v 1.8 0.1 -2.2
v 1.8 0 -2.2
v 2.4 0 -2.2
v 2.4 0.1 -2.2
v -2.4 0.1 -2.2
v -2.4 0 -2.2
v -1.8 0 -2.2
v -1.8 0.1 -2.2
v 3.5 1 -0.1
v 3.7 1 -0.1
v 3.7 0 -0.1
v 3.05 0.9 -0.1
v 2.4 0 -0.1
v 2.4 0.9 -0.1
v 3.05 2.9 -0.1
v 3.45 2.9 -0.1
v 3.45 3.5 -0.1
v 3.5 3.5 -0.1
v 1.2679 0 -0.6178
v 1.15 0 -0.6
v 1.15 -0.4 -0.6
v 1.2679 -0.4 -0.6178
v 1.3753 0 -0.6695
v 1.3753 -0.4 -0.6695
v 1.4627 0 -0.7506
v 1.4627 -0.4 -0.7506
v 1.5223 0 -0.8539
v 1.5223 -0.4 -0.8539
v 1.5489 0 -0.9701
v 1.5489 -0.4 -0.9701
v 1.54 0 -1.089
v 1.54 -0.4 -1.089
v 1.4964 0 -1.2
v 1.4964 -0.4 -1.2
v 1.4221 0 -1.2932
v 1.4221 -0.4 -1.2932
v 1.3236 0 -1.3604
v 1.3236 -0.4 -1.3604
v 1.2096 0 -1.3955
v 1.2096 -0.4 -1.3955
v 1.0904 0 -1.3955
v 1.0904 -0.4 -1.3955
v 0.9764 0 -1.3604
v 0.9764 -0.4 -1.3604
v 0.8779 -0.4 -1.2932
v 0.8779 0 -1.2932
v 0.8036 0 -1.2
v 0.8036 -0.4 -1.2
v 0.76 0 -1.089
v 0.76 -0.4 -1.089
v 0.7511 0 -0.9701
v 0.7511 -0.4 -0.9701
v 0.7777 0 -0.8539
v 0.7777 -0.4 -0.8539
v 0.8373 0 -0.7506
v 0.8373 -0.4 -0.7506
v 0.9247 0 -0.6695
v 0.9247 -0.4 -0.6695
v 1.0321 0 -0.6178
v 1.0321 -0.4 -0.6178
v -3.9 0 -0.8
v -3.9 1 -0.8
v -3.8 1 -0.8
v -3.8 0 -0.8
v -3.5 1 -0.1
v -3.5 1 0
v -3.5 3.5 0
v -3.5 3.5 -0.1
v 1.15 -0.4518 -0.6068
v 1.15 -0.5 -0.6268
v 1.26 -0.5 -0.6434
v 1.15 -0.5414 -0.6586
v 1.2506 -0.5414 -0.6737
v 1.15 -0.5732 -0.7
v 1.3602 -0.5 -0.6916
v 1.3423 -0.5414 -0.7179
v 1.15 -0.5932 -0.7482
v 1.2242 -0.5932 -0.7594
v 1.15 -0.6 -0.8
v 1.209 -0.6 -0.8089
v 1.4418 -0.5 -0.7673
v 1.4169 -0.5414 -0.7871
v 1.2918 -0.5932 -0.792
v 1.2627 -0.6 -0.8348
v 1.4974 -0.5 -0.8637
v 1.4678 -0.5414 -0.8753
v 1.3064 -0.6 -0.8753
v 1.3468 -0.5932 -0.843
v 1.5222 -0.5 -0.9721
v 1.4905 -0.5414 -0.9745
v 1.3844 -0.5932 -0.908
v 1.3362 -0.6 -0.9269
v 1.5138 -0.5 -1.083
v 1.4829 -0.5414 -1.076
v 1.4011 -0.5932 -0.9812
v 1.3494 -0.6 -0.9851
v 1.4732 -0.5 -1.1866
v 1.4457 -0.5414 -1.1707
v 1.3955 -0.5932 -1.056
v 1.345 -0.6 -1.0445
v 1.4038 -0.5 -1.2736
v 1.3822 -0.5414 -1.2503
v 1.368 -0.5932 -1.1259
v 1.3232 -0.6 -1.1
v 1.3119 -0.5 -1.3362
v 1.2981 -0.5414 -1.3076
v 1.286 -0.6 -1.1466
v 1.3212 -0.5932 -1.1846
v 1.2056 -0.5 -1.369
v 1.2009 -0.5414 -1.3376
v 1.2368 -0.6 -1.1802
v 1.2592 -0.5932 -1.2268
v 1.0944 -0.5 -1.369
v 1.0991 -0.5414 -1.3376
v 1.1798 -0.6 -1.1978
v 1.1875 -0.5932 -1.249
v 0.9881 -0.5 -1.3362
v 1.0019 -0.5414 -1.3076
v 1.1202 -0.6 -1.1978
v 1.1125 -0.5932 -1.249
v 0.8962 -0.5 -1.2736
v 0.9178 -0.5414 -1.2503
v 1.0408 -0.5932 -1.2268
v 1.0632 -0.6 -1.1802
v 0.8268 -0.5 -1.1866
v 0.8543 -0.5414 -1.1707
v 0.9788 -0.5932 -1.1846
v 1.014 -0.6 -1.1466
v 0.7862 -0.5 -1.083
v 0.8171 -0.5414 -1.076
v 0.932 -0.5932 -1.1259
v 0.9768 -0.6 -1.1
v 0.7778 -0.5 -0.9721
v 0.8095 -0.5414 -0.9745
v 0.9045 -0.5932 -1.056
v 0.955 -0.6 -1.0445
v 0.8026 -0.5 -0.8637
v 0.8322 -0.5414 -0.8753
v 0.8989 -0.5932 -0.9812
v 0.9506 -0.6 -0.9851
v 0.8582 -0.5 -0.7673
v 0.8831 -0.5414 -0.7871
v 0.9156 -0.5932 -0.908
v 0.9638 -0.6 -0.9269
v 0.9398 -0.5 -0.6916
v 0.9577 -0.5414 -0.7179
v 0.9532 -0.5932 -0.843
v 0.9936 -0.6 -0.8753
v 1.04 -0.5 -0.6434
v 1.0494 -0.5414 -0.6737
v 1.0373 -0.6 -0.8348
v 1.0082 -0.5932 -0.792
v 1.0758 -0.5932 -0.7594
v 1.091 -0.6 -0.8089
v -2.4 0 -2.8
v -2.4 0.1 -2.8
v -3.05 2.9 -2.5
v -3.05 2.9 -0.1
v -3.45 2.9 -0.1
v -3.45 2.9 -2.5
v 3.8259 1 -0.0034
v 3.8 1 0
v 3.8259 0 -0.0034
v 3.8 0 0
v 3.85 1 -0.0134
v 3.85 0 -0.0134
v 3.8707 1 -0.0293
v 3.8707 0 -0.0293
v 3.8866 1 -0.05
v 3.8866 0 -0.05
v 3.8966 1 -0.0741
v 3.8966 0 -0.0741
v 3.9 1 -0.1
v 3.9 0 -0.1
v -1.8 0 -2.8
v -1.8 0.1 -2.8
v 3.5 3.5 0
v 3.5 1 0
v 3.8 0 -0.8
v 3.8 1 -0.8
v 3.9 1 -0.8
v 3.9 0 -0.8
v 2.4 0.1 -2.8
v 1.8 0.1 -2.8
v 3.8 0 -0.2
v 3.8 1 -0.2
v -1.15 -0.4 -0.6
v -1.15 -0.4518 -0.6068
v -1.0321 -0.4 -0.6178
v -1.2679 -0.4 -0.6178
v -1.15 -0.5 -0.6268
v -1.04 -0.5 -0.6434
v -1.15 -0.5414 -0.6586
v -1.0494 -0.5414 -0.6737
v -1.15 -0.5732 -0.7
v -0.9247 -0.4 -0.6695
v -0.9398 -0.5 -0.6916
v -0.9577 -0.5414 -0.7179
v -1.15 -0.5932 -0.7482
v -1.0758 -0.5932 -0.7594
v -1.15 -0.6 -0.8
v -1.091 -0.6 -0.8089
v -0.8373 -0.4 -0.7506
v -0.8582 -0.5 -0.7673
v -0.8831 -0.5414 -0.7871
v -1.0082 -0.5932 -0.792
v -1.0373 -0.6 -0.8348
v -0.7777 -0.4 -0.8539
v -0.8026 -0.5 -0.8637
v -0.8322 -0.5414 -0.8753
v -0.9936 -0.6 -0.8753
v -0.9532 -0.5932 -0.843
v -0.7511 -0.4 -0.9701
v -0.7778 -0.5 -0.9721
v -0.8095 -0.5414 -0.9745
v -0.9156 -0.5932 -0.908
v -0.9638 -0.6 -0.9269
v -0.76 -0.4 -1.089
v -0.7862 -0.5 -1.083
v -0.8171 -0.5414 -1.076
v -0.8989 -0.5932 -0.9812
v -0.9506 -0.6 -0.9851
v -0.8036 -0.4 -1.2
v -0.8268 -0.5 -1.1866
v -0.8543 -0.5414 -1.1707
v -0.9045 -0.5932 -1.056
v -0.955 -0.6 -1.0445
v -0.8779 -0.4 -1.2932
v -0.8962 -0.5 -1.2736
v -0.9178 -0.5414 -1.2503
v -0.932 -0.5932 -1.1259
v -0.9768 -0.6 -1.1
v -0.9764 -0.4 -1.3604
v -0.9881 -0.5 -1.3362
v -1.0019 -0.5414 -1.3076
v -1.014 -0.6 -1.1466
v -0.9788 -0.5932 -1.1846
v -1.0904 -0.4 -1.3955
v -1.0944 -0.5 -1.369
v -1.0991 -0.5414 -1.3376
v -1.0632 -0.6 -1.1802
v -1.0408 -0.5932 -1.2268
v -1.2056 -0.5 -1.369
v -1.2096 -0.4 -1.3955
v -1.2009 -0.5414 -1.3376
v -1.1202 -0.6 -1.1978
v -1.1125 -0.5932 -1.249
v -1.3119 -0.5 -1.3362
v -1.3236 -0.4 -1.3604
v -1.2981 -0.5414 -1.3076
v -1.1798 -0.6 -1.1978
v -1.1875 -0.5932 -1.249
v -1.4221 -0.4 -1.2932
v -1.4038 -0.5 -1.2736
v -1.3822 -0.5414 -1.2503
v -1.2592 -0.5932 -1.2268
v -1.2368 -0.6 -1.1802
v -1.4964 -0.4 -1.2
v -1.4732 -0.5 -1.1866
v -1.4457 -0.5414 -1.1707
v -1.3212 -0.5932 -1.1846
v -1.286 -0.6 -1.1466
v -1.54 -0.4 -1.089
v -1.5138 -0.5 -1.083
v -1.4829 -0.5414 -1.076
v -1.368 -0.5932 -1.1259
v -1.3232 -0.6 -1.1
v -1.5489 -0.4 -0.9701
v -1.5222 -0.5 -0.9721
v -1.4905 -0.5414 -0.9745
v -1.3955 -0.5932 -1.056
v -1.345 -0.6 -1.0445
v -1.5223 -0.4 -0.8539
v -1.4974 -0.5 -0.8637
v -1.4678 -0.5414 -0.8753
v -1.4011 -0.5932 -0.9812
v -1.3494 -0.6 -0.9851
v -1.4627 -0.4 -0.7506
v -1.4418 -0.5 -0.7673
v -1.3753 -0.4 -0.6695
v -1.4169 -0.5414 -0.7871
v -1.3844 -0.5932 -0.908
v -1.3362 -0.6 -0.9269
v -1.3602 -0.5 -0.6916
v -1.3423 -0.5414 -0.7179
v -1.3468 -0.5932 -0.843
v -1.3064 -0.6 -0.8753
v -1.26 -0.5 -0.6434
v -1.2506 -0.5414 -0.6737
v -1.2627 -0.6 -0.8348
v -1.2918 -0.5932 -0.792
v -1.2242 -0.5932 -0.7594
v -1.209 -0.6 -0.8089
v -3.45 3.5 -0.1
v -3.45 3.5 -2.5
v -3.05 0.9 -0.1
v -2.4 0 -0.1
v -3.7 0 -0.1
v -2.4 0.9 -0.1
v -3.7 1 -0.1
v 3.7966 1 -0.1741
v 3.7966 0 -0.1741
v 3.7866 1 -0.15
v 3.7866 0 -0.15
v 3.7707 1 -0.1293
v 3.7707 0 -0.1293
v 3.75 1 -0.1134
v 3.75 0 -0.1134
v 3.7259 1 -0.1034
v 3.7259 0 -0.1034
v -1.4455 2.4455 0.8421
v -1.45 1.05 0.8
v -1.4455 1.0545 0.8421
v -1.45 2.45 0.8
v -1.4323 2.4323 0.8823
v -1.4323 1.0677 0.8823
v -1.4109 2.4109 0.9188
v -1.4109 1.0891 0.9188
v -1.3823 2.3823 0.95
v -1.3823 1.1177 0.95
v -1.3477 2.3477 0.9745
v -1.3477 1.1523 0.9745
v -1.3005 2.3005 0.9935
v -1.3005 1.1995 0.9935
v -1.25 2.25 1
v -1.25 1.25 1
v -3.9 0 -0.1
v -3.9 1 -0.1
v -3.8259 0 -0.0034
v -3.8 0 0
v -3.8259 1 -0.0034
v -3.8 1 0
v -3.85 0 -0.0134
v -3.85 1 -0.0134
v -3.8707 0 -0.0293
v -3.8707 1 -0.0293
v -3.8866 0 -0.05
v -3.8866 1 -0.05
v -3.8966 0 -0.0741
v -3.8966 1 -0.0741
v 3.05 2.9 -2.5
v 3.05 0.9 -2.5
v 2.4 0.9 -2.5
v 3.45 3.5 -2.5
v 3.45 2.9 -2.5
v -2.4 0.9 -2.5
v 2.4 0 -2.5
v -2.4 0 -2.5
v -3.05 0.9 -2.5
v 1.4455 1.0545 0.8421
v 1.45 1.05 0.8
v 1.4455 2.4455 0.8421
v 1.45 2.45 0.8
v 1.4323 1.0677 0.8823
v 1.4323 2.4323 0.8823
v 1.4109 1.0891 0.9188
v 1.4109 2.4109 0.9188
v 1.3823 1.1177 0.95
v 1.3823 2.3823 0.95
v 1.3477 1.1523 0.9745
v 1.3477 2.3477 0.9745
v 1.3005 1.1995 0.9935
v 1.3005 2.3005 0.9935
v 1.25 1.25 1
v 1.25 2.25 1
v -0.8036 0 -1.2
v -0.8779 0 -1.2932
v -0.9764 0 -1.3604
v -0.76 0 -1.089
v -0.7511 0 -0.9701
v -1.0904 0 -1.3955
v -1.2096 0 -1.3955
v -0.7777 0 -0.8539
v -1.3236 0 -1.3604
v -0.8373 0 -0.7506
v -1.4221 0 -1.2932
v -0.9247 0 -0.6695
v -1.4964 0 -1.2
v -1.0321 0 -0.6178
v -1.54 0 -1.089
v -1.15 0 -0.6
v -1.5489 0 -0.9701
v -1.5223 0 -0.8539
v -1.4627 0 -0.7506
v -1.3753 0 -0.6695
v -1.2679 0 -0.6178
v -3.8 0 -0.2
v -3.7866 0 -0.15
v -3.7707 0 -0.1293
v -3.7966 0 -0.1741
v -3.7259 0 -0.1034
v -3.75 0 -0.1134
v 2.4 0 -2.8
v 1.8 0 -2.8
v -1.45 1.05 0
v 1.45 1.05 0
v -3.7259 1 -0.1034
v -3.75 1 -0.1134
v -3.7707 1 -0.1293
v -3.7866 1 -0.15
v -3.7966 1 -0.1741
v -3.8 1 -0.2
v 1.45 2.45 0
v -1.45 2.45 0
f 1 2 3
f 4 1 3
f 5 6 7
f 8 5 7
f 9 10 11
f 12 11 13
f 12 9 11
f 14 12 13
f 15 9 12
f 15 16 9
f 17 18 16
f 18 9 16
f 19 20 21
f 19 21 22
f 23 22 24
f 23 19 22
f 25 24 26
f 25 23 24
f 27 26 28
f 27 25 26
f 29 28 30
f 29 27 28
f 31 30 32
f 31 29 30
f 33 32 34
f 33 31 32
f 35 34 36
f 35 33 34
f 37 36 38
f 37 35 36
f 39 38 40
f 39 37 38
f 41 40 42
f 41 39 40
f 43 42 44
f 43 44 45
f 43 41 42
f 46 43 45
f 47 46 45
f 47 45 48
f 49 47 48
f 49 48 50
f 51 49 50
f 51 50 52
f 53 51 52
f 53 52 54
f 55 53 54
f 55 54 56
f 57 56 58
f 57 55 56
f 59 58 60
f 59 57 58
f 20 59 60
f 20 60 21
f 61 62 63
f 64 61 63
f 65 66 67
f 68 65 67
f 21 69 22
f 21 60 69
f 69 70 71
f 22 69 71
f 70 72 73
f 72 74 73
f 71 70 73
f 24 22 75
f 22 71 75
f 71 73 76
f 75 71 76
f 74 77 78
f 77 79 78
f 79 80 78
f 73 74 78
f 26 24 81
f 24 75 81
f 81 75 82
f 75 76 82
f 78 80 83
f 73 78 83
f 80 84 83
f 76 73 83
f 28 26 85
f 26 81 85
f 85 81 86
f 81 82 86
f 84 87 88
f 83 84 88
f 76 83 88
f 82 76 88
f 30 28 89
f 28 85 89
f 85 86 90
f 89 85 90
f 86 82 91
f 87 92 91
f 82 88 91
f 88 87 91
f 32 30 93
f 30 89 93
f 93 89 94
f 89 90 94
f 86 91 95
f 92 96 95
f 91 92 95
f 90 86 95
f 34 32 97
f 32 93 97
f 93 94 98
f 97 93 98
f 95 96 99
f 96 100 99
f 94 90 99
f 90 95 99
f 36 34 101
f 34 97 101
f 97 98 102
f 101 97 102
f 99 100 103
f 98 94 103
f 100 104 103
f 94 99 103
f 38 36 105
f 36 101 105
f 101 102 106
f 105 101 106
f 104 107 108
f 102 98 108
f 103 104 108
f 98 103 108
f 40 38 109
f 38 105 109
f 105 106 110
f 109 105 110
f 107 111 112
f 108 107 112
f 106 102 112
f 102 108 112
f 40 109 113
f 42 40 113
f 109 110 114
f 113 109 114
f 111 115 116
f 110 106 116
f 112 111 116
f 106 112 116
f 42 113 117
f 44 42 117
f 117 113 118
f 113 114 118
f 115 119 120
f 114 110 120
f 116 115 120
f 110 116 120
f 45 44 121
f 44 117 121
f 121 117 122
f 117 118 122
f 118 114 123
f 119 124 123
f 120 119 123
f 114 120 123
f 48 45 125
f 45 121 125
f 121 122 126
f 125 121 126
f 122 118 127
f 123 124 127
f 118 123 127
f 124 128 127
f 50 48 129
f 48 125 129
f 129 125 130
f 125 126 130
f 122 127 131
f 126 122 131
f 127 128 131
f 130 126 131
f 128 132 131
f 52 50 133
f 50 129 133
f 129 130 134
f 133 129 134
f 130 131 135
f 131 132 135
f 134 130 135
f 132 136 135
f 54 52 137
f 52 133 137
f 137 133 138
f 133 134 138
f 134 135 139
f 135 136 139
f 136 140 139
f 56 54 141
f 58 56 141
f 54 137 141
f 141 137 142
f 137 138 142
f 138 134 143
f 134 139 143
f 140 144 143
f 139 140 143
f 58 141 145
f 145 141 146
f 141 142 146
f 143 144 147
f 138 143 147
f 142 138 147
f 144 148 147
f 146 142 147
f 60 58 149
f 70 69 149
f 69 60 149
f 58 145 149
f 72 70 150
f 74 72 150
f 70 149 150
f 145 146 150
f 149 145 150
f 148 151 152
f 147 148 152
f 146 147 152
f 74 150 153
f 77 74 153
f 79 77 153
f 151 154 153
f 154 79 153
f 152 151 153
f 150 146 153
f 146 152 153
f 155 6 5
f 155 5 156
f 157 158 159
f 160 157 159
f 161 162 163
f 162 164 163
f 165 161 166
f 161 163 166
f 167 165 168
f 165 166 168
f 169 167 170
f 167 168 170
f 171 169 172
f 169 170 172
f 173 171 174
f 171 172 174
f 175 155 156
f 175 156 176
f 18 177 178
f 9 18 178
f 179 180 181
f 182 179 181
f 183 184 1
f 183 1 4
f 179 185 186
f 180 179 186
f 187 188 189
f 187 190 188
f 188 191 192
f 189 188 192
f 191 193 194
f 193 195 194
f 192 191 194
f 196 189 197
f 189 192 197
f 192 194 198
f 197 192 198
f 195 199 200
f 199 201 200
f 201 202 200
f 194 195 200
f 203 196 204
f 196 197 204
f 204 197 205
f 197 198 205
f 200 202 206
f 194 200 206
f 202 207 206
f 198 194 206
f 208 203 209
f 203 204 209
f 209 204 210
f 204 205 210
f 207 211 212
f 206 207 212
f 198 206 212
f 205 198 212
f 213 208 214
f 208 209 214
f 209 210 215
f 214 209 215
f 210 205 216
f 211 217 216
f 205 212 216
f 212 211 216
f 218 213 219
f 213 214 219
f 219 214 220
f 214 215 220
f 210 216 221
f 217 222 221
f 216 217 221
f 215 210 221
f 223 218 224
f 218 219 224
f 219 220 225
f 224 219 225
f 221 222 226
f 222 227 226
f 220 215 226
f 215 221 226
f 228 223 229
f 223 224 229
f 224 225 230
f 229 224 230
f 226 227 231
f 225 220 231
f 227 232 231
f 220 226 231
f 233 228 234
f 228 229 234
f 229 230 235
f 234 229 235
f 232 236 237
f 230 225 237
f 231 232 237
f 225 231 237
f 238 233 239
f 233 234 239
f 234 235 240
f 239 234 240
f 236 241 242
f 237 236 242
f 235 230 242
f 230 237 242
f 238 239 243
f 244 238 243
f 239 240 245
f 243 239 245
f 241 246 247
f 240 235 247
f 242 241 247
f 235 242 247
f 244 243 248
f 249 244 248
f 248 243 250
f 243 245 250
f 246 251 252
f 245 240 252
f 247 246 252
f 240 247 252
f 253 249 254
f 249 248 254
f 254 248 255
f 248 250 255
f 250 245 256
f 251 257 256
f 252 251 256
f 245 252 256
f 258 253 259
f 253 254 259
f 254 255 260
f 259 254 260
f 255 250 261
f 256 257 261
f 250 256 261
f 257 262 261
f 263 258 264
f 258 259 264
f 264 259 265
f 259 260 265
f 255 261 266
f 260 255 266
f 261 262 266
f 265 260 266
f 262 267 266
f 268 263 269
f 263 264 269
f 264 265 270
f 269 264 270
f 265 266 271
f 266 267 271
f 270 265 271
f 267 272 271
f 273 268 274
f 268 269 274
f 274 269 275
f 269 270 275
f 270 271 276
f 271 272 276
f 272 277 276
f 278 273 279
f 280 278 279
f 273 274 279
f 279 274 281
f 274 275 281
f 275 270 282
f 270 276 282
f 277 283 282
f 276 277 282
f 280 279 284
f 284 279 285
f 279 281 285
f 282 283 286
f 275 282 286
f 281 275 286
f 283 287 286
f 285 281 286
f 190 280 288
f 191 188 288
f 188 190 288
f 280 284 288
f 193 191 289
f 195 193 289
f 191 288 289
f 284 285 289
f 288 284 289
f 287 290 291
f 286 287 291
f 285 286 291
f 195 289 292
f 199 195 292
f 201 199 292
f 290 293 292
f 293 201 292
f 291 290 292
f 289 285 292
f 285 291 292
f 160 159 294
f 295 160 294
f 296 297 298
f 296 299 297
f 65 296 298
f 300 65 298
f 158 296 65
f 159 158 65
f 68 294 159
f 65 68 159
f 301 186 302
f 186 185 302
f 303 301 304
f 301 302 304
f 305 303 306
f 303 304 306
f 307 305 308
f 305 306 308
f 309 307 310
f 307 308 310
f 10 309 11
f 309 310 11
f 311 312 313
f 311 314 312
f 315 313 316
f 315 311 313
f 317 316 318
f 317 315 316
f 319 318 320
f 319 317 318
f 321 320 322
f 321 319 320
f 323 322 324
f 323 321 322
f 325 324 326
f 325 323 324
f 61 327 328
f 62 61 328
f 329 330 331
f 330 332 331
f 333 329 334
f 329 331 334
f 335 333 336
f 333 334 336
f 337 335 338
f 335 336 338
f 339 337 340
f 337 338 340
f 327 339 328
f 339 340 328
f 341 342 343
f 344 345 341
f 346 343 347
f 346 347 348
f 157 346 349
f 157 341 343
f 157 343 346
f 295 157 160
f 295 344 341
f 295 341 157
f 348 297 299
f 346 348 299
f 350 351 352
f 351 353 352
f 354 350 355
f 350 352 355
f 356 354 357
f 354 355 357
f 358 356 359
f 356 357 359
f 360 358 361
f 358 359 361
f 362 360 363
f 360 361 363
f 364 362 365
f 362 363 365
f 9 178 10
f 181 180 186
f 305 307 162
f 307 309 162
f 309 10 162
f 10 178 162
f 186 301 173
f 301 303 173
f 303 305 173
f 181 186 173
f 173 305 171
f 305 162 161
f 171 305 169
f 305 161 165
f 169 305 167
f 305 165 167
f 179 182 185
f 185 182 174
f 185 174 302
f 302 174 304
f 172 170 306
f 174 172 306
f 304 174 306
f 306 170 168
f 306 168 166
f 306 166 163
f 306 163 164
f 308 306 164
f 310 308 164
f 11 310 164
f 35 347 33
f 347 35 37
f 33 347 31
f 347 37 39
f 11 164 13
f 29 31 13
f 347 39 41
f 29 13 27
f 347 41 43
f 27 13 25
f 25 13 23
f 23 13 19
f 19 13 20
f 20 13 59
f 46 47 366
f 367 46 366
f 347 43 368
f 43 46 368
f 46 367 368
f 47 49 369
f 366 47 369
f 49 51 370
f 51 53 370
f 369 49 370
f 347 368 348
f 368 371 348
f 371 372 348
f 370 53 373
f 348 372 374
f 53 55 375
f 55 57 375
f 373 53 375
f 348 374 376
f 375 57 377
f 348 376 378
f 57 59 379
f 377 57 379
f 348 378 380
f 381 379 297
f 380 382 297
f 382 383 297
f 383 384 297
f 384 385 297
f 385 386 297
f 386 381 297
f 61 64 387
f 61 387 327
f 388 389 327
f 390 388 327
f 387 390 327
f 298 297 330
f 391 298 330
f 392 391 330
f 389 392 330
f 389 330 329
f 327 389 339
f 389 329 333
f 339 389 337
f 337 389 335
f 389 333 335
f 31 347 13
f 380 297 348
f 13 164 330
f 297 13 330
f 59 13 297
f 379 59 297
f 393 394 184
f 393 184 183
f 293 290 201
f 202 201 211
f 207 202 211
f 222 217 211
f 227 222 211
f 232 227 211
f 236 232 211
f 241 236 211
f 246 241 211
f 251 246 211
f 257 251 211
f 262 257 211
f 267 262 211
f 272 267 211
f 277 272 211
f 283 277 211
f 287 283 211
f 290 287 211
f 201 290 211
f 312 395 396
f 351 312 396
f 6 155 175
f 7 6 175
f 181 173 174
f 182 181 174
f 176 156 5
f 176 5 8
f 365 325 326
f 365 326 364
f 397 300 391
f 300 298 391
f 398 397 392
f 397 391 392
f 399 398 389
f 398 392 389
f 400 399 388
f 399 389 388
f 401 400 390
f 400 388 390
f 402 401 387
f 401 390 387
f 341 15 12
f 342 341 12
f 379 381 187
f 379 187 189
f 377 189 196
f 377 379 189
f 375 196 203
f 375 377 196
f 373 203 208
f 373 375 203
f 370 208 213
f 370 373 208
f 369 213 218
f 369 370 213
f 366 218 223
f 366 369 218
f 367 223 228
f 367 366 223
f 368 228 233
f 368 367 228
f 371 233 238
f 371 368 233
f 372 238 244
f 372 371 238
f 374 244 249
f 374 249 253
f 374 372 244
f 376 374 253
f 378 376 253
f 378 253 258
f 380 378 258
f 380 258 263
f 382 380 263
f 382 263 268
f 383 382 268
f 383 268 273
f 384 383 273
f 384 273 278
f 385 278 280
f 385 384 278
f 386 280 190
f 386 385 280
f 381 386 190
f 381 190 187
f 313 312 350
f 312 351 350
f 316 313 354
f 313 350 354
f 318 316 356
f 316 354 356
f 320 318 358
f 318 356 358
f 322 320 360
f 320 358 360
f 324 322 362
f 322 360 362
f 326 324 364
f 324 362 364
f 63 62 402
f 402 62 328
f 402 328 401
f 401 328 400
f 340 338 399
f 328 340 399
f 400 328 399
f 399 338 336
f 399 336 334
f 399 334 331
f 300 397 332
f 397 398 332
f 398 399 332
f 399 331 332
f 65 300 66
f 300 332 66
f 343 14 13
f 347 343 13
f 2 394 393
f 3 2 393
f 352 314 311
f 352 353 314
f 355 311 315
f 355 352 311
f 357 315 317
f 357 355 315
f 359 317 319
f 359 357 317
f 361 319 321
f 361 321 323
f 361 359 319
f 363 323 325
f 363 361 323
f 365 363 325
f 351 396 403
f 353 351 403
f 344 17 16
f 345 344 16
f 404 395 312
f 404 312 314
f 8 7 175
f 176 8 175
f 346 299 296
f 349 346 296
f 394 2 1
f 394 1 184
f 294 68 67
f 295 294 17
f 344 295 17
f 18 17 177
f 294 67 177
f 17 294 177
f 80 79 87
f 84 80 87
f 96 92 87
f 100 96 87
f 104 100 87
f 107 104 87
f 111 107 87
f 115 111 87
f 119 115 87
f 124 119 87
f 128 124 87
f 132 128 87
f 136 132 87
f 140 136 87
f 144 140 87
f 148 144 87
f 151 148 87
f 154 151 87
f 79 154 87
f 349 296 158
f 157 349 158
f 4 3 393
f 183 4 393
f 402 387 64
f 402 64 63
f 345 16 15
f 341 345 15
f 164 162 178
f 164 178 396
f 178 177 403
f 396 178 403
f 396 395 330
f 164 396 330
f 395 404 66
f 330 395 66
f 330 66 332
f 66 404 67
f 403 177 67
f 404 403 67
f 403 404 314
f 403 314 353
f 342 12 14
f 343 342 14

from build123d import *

# Parameters (mm, degrees)
EXTRUDE_1_DEPTH   = 2.5
EXTRUDE_2_DEPTH   = 0.1
SKETCH_3_W        = 0.1
SKETCH_3_H        = 1
EXTRUDE_3_DEPTH   = 0.8
FILLET_1_R        = 0.1
SKETCH_4_R        = 0.4
EXTRUDE_4_DEPTH   = 0.6
FILLET_2_R        = 0.2
SKETCH_5_W        = 0.6
SKETCH_5_H        = 0.6
EXTRUDE_5_DEPTH   = 0.1
EXTRUDE_5_2_DEPTH = 0.1
SKETCH_6_W        = 2.9
SKETCH_6_H        = 1.4
EXTRUDE_6_DEPTH   = 1
FILLET_3_R        = 0.2


with BuildPart() as part:
    # 스케치1 → 보스-돌출1 (new body)
    with BuildSketch(Plane.XY):
        Polygon((3.45, 2.9), (3.05, 2.9), (3.05, 0.9), (2.4, 0.9), (2.4, 0), (-2.4, 0), (-2.4, 0.9), (-3.05, 0.9), (-3.05, 2.9), (-3.45, 2.9), (-3.45, 3.5), (3.45, 3.5), align=None)
    extrude(amount=-EXTRUDE_1_DEPTH)

    # 스케치2 → 보스-돌출2 (add)
    with BuildSketch(Plane.XY):
        Polygon((-3.5, 1), (-3.5, 3.5), (3.5, 3.5), (3.5, 1), (3.9, 1), (3.9, 0), (-3.9, 0), (-3.9, 1), align=None)
    extrude(amount=-EXTRUDE_2_DEPTH)

    # 스케치3 → 보스-돌출3 (add)
    with BuildSketch(Plane.XY):
        with Locations((3.85, 0.5)):
            Rectangle(SKETCH_3_W, SKETCH_3_H)
        with Locations((-3.85, 0.5)):
            Rectangle(SKETCH_3_W, SKETCH_3_H)
    extrude(amount=-EXTRUDE_3_DEPTH)

    # 필렛1
    fillet_1_edges = [part.edges().sort_by_distance(p)[0] for p in [
        (3.9, 0.5, 0),
        (-3.9, 0.5, 0),
        (3.8, 0.5, -0.1),
        (-3.8, 0.5, -0.1),
    ]]
    fillet(fillet_1_edges, radius=FILLET_1_R)

    # 스케치4 → 보스-돌출4 (add)
    with BuildSketch(Plane(origin=(0, 0, 0), x_dir=(1, 0, 0), z_dir=(0, 1, 0))):
        with Locations(Location((-1.15, 1, 0), (0, 0, 270))):
            Circle(SKETCH_4_R)
        with Locations(Location((1.15, 1, 0), (0, 0, 270))):
            Circle(SKETCH_4_R)
    extrude(amount=-EXTRUDE_4_DEPTH)

    # 필렛2
    fillet_2_edges = [part.edges().sort_by_distance(p)[0] for p in [
        (-1.15, -0.6, -1.4),
        (1.15, -0.6, -1.4),
    ]]
    fillet(fillet_2_edges, radius=FILLET_2_R)

    # 스케치6 → 보스-돌출6 (add)
    with BuildSketch(Plane.XY):
        with Locations((0, 1.75)):
            Rectangle(SKETCH_6_W, SKETCH_6_H)
    extrude(amount=EXTRUDE_6_DEPTH)

    # 필렛3
    fillet_3_edges = [part.edges().sort_by_distance(p)[0] for p in [
        (-1.45, 1.75, 1),
        (0, 1.05, 1),
        (1.45, 1.75, 1),
        (0, 2.45, 1),
    ]]
    fillet(fillet_3_edges, radius=FILLET_3_R)


with BuildPart() as body_2:
    # 스케치5 → 보스-돌출5 (new body)
    with BuildSketch(Plane(origin=(0, 0, 0), x_dir=(1, 0, 0), z_dir=(0, 1, 0))):
        with Locations((-2.1, 2.5)):
            Rectangle(SKETCH_5_W, SKETCH_5_H)
    extrude(amount=EXTRUDE_5_DEPTH)


with BuildPart() as body_3:
    # 스케치5 → Extrude 5 2 (new body)
    with BuildSketch(Plane(origin=(0, 0, 0), x_dir=(1, 0, 0), z_dir=(0, 1, 0))):
        with Locations((2.1, 2.5)):
            Rectangle(SKETCH_5_W, SKETCH_5_H)
    extrude(amount=EXTRUDE_5_2_DEPTH)


solid = Compound([part.part, body_2.part, body_3.part])
